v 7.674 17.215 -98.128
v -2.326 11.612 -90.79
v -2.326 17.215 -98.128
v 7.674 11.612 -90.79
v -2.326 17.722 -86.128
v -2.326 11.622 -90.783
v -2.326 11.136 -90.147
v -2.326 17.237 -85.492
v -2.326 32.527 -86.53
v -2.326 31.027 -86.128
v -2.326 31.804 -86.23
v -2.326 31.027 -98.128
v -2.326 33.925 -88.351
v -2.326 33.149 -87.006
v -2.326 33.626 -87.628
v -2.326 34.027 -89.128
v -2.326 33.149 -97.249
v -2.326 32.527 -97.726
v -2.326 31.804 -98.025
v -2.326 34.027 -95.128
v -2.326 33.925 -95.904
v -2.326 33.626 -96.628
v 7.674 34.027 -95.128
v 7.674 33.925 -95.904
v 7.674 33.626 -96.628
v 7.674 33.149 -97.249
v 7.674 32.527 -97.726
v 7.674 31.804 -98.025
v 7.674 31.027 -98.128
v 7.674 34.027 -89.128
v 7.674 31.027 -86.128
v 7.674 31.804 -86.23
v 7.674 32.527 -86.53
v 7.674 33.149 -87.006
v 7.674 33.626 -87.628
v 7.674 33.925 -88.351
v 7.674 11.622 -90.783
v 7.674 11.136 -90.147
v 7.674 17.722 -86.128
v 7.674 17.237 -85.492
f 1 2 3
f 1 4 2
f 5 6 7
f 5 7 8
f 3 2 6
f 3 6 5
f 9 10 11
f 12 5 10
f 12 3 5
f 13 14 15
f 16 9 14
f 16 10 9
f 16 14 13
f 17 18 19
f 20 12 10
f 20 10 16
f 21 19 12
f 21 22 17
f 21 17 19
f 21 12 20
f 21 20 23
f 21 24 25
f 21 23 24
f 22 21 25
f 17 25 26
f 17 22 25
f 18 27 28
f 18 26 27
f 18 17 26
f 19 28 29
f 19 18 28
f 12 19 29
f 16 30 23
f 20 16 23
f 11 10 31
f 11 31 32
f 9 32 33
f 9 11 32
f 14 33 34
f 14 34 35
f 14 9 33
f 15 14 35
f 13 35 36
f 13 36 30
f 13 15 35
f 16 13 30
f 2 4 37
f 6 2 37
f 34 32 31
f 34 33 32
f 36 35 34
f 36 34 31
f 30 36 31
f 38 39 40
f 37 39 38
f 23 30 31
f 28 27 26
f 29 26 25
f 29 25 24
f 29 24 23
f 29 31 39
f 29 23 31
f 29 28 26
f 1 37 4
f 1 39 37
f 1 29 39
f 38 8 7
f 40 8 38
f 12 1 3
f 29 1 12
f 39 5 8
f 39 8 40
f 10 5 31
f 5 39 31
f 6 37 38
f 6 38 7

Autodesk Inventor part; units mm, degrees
ref_plane "YZ Plane" through (0, 0, 0) normal (1, 0, 0) x (0, 1, 0)
ref_plane "XZ Plane" through (0, 0, 0) normal (0, 1, 0) x (-1, 0, 0)
ref_plane "XY Plane" through (0, 0, 0) normal (0, 0, 1) x (1, 0, 0)
sketch "Sketch1" plane through (0, 0, 0) normal (0, 1, 0) x (-1, 0, 0)
  line L0 (2.325581, 24.418605) -> (-7.674419, 24.418605)
  line L1 (-7.674419, 24.418605) -> (-7.674419, -75.581395)
  line L2 (-7.674419, -75.581395) -> (2.325581, -75.581395)
  line L3 (2.325581, -75.581395) -> (2.325581, 24.418605)
  point P0 (0, 0)
  dimension "d2" = 100
  dimension "d3" = 10
extrude "Extrusion1" add sketch "Sketch1" along normal blind 10
sketch "Sketch9" plane through (7.674419, 0, 24.418605) normal (1, 0, 0) x (0, 0, -1)
  line L0 (0, 10) -> (100, 10) projected
  line L1 (0, 0) -> (100, 0) projected
  line L2 (0, 10) -> (100, 10)
  line L3 (100, 10) -> (100, 0)
  line L4 (100, 0) -> (0, 0)
  line L5 (0, 0) -> (0, 10)
  point P0 (24.418605, 0)
extrude "Extrusion8" cut sketch "Sketch9" against normal blind 5
sketch "Sketch10" plane through (2.674419, 0, 24.418605) normal (1, 0, 0) x (0, 0, -1)
  line L0 (100, 0) -> (100, 10) projected
  line L1 (100, 10) -> (126, 10)
  line L2 (126, 10) -> (126, 29.842)
  line L3 (126, 29.842) -> (100, 10)
  line L4 (126, 29.842) -> (126, 19.842)
  line L5 (126, 19.842) -> (100, 0)
  point P0 (24.418605, 0)
  dimension "d44" = 19.842
  dimension "d45" = 26
  dimension "d46" = 10
extrude "Extrusion9" add sketch "Sketch10" against normal blind 5 contours L0 L1 L5 | L3 L2 L5 L1
sketch "Sketch12" plane through (2.674419, 0, 24.418605) normal (1, 0, 0) x (0, 0, -1)
  line L0 (100, 0) -> (0, 0)
  line L1 (126, 29.842) -> (126, 19.842)
  line L2 (99.933064, 0) -> (126, 19.842)
  line L3 (126, 19.842) -> (126, 29.842)
  line L4 (126, 29.842) -> (99.933064, 10)
  line L5 (99.933064, 10) -> (99.933064, 0)
  point P0 (24.418605, 0)
extrude "Extrusion10" add sketch "Sketch12" along normal blind 5
sketch "Sketch13" plane through (2.674419, 0, 24.418605) normal (1, 0, 0) x (0, 0, -1)
  line L0 (100, 10) -> (0, 10) projected
  line L1 (100, 0) -> (0, 0) projected
  line L2 (0, 10) -> (100, 10)
  line L3 (100, 10) -> (100, 0)
  line L4 (100, 0) -> (0, 0)
  line L5 (0, 0) -> (0, 10)
  point P0 (24.418605, 0)
extrude "Extrusion11" add sketch "Sketch13" along normal blind 5
sketch "Sketch2" plane through (0, 10, 0) normal (0, 1, 0) x (1, 0, 0)
  line L0 (-2.325581, -24.418605) -> (7.674419, -24.418605)
  line L1 (7.674419, -24.418605) -> (7.674419, 75.581395)
  line L2 (-2.325581, -24.418605) -> (7.674419, -24.418605)
  line L3 (2.674419, -24.418605) -> (2.674419, -14.418605)
  line L4 (2.674419, -14.418605) -> (2.674419, -4.418605)
  line L5 (2.674419, -4.418605) -> (2.674419, 10.581395)
  line L6 (2.674419, 10.581395) -> (2.674419, 25.581395)
  line L7 (7.674419, 75.581395) -> (-2.325581, 75.581395)
  line L8 (-2.325581, 75.581395) -> (7.674419, 75.581395)
  line L9 (2.674419, -24.418605) -> (2.674419, 25.581395)
  line L10 (2.674419, 25.581395) -> (7.674419, 25.581395)
  line L11 (2.674419, 25.581395) -> (-2.325581, 25.581395)
  line L12 (-2.325581, 75.581395) -> (-2.325581, -24.418605)
  line L13 (2.674419, 25.581395) -> (2.674419, 40.581395)
  line L14 (2.674419, 25.581395) -> (2.674419, 75.581395)
  line L15 (2.674419, 0.581395) -> (-2.325581, 0.581395)
  line L16 (2.674419, 0.581395) -> (7.674419, 0.581395)
  line L17 (2.674419, 50.581395) -> (-2.325581, 50.581395)
  line L18 (7.674419, 50.581395) -> (2.674419, 50.581395)
  circle A0 centre (2.674419, 0.581395) radius 2
  circle A1 centre (2.674419, 25.581395) radius 2
  circle A2 centre (2.674419, 50.581395) radius 2
  point P0 (0, 0)
  dimension "d28" = 4
  dimension "d29" = 4
  dimension "d30" = 4
extrude "Extrusion2" cut sketch "Sketch2" against normal blind 10 contours A0 L5 L15 | L15 L5 A0 | A1 L13 L11 | L11 L6 A1 | L16 A0 L5 | L5 A0 L16 | L10 A1 L6 | L13 A1 L10 | A2 L14 L17 | L17 L14 A2 | L18 A2 L14 | L14 A2 L18
sketch "Sketch14" plane through (7.674419, 0, 24.418605) normal (1, 0, 0) x (0, 0, -1)
  line L0 (100, 10) -> (0, 10) projected
  line L1 (126, 19.842) -> (100, 0) projected
  line L2 (100, 10) -> (100, 0)
  point P0 (24.418605, 0)
sketch "Sketch16" plane through (7.674419, 0, 24.418605) normal (1, 0, 0) x (0, 0, -1)
  line L0 (100, 10) -> (126, 29.842)
  line L1 (100, 10) -> (112.896482, 19.842)
  line L2 (112.896482, 19.842) -> (113.514198, 20.313412)
  line L3 (113.514198, 20.313412) -> (118.329114, 14.004177)
  line L4 (117.711399, 13.532765) -> (112.884086, 19.858243)
  line L5 (117.711399, 13.532765) -> (118.329114, 14.004177)
  point P0 (24.418605, 0)
  dimension "d60" = 16.22295
  dimension "d61" = 0.77705
extrude "Extrusion13" add sketch "Sketch16" against normal blind 10
sketch "Sketch20" plane through (7.674419, 0, 24.418605) normal (1, 0, 0) x (0, 0, -1)
  line L0 (100, 10) -> (0, 10) projected
  line L1 (100, 10) -> (128, 10)
  line L2 (128, 10) -> (128, 0)
  line L3 (128, 0) -> (100, 0)
  line L4 (100, 0) -> (100, 10)
  line L5 (126, 29.842) -> (100, 10) projected
  line L6 (100, 10) -> (126, 10)
  line L7 (126, 10) -> (126, 29.842)
  line L8 (126, 29.842) -> (100, 29.842)
  line L9 (100, 29.842) -> (100, 10)
  point P0 (24.418605, 0)
  dimension "d77" = 28
extrude "Extrusion17" add sketch "Sketch20" against normal blind 10 contours L1 L2 L3 L4
sketch "Sketch21" plane through (7.674419, 0, 24.418605) normal (1, 0, 0) x (0, 0, -1)
  line L0 (128, 0) -> (128, 10)
  line L1 (128, 0) -> (151.87052, 18.170101)
  line L2 (113.070317, 10) -> (126, 19.842)
  line L3 (128, 10) -> (151.239467, 27.689747)
  line L4 (151.87052, 18.170101) -> (151.87052, 28.170101)
  line L5 (151.87052, 28.170101) -> (151.239467, 27.689747)
  line L6 (100, 10) -> (0, 10)
  line L7 (126, 29.842) -> (100, 29.842)
  line L8 (100, 29.842) -> (100, 10)
  line L9 (100, 10) -> (126, 10)
  line L10 (126, 10) -> (126, 29.842)
  point P0 (24.418605, 0)
extrude "Extrusion18" add sketch "Sketch21" against normal blind 10 contours L0 L3 L5 L4 L1
sketch "Sketch22" plane through (7.674419, 0, 24.418605) normal (1, 0, 0) x (0, 0, -1)
  line L0 (100, 10) -> (126, 29.842) projected
  line L1 (100, 10) -> (0, 10) projected
  line L2 (126, 29.842) -> (100, 29.842)
  line L3 (100, 29.842) -> (100, 10)
  line L4 (100, 10) -> (126, 10)
  line L5 (126, 10) -> (126, 29.842)
  point P0 (24.418605, 0)
extrude "Extrusion19" cut sketch "Sketch22" against normal blind 10
sketch "Sketch23" plane through (7.674419, 0, 24.418605) normal (1, 0, 0) x (0, 0, -1)
  line L0 (151.87052, 18.170101) -> (128, 0)
  line L1 (141.891396, 10.57405) -> (136.99663, 17.004426)
  line L2 (128, 0) -> (151.87052, 18.170101)
  line L3 (128, 10) -> (151.87052, 28.170101)
  line L4 (137.071931, 16.905501) -> (151.87052, 28.170101)
  line L5 (151.87052, 28.170101) -> (151.87052, 18.170101)
  line L6 (141.891396, 10.57405) -> (151.87052, 18.170101)
  point P0 (24.418605, 0)
  point P1 (137.071931, 16.905501)
extrude "Extrusion20" cut sketch "Sketch23" against normal blind 10
sketch "Sketch24" plane through (7.674419, 0, 24.418605) normal (1, 0, 0) x (0, 0, -1)
  line L0 (141.891396, 10.57405) -> (137.071931, 16.905501)
  line L1 (137.071931, 16.905501) -> (120.042183, 39.277911)
  line L2 (120.042183, 39.277911) -> (114.78111, 35.273213)
  line L3 (114.78111, 35.273213) -> (131.810859, 12.900804)
  line L4 (128, 10) -> (137.071931, 16.905501)
  line L5 (130.433663, 25.626361) -> (125.172591, 21.621663)
  point P0 (24.418605, 0)
extrude "Extrusion21" add sketch "Sketch24" against normal blind 10 contours L4 L3 L5 L1
sketch "Sketch25" plane through (7.674419, 0, 24.418605) normal (1, 0, 0) x (0, 0, -1)
  circle A0 centre (130.028114, 20.963065) radius 1.414214
  line L0 (128, 0) -> (141.891396, 10.57405)
  point P0 (24.418605, 0)
  dimension "d88" = 15.452
extrude "Extrusion22" cut sketch "Sketch25" against normal blind 10
sketch "Sketch26" plane through (7.674419, 0, 24.418605) normal (1, 0, 0) x (0, 0, -1)
  line L0 (146.180534, 13.38523) -> (129.005429, 0.311641)
  line L1 (128, 0) -> (141.891396, 10.57405)
  line L2 (129.005429, 0.311641) -> (127.101128, -1.137903)
  line L3 (128, 0) -> (128.596019, 0)
  line L4 (128, 10) -> (141.733271, 10)
  point P0 (24.418605, 0)
  point P1 (137.592982, 6.848436)
  point P2 (141.137252, 10)
  dimension "d89" = 0.361
extrude "Extrusion23" add sketch "Sketch26" against normal blind 10
sketch "Sketch27" plane through (7.674419, 0, 24.418605) normal (1, 0, 0) x (0, 0, -1)
  line L0 (128.596019, 0) -> (141.733271, 10)
  line L1 (141.733271, 10) -> (143.644553, 11.454856)
  line L2 (141.733271, 10) -> (141.137252, 10)
  line L3 (141.733271, 10) -> (141.137252, 10)
  line L4 (141.137252, 10) -> (143.4259, 11.742106)
  line L5 (143.4259, 11.742106) -> (143.644553, 11.454856)
  line L6 (143.4259, 11.742106) -> (141.608381, 14.129826)
  line L7 (141.608381, 14.129826) -> (140.073877, 12.96177)
  line L8 (130.433663, 25.626361) -> (141.891396, 10.57405)
  line L9 (141.891396, 10.57405) -> (140.073877, 12.96177)
  line L10 (141.891396, 10.57405) -> (130.433663, 25.626361)
  point P0 (24.418605, 0)
  dimension "d92" = 2.402
extrude "Extrusion24" add sketch "Sketch27" against normal blind 10
sketch "Sketch28" plane through (7.674419, 0, 24.418605) normal (1, 0, 0) x (0, 0, -1)
  line L0 (129.774875, 26.828636) -> (140.680759, 12.501302)
  line L1 (140.073877, 12.96177) -> (130.433663, 25.626361)
  line L2 (130.433663, 25.626361) -> (130.595987, 25.749921)
  line L3 (140.073877, 12.96177) -> (141.608381, 14.129826)
  line L4 (140.073877, 12.96177) -> (140.2362, 13.08533)
  line L5 (140.073877, 12.96177) -> (130.433663, 25.626361)
  point P0 (24.418605, 0)
  dimension "d95" = 0.204
extrude "Extrusion25" add sketch "Sketch28" against normal blind 10
sketch "Sketch29" plane through (7.674419, 0, 24.418605) normal (1, 0, 0) x (0, 0, -1)
  line L0 (130.595987, 25.749921) -> (140.2362, 13.08533)
  line L1 (130.595987, 25.749921) -> (115.000185, 13.878487)
  line L2 (143.644553, 11.454856) -> (128.596019, 0)
  line L3 (137.494115, 6.773179) -> (119.565826, 30.326023)
  line L4 (122.798086, 19.814204) -> (116.546182, 28.027488)
  line L5 (116.546182, 28.027488) -> (116.546182, 10)
  line L6 (0, 10) -> (128, 10)
  line L7 (128, 10) -> (100, 10)
  line L8 (116.546182, 28.027488) -> (110.546182, 28.027488)
  line L9 (110.546182, 28.027488) -> (110.546182, 34.027488)
  line L10 (116.546182, 28.027488) -> (122.546182, 28.027488)
  line L11 (122.546182, 28.027488) -> (122.546182, 10)
  line L12 (110.546182, 34.027488) -> (122.546182, 34.027488)
  line L13 (122.546182, 34.027488) -> (122.546182, 10)
  line L14 (122.546182, 10) -> (110.546182, 10)
  line L15 (110.546182, 10) -> (110.546182, 34.027488)
  point P0 (24.418605, 0)
  point P1 (122.546182, 28.027488)
  point P2 (110.546182, 28.027488)
  point P3 (110.546182, 10)
  point P4 (122.546182, 10)
  dimension "d98" = 19.6
  dimension "d99" = 29.6
  dimension "d101" = 6
  dimension "d102" = 6
  dimension "d103" = 6
extrude "Extrusion26" add sketch "Sketch29" against normal blind 10 contours L11 L4 L10 L3 | L3 L10 L11 | L11 L6 L5 L1 | L1 L5 L4 L11 | L10 L8 L9 L12 L13 | L5 L6 L15 L8
sketch "Sketch30" plane through (7.674419, 0, 24.418605) normal (1, 0, 0) x (0, 0, -1)
  line L0 (122.546182, 34.027488) -> (122.546182, 10)
  line L1 (122.546182, 34.027488) -> (144, 34.027488)
  line L2 (144, 34.027488) -> (144, 0)
  line L3 (144, 0) -> (122.546182, 0)
  line L4 (122.546182, 0) -> (122.546182, 34.027488)
  point P0 (24.418605, 0)
extrude "Extrusion27" cut sketch "Sketch30" against normal blind 10
sketch "Sketch31" plane through (7.674419, 0, 24.418605) normal (1, 0, 0) x (0, 0, -1)
  line L0 (110.546182, 34.027488) -> (110.546182, 10)
  line L1 (110.546182, 10) -> (113, 10)
  line L2 (110.546182, 10) -> (114, 10)
  line L3 (114, 10) -> (114, 17)
  line L4 (114, 17) -> (110.546182, 17)
  line L5 (110.546182, 17) -> (110.546182, 10)
  point P0 (24.418605, 0)
extrude "Extrusion28" cut sketch "Sketch31" against normal blind 10
sketch "Sketch32" plane through (7.674419, 0, 24.418605) normal (1, 0, 0) x (0, 0, -1)
  line L0 (114, 17) -> (110.546182, 17)
  line L1 (114, 17) -> (114, 10)
  line L2 (110.546182, 17) -> (114, 10)
  line L3 (114, 10) -> (114, 17)
  line L4 (114, 17) -> (110.546182, 17)
  point P0 (24.418605, 0)
extrude "Extrusion29" add sketch "Sketch32" against normal blind 10
sketch "Sketch33" plane through (7.674419, 0, 24.418605) normal (1, 0, 0) x (0, 0, -1)
  line L0 (100, 10.050951) -> (99.933064, 10)
  line L1 (100, 10.050951) -> (99.933064, 10)
  line L2 (99.933064, 10) -> (100, 10)
  line L3 (99.933064, 10) -> (100, 10)
  line L4 (100, 10) -> (100, 10.050951)
  line L5 (100, 10) -> (100, 10.050951)
  point P0 (24.418605, 0)
extrude "Extrusion30" cut sketch "Sketch33" against normal blind 10
sketch "Sketch34" plane through (7.674419, 0, 24.418605) normal (1, 0, 0) x (0, 0, -1)
  line L0 (119.614525, 21.220993) -> (127.725416, 4.782304)
  line L1 (110.546182, 17) -> (114, 10)
  line L2 (127.725416, 4.782304) -> (130.085017, 0)
  line L3 (122.546182, 0) -> (0, 0)
  line L4 (116.504679, 0) -> (130.085017, 0)
  line L5 (127.725416, 4.782304) -> (130.085017, 0)
  line L6 (122.546182, 34.027488) -> (122.546182, 0)
  line L7 (122.546182, 15.279278) -> (122.546182, 0)
  point P0 (24.418605, 0)
  dimension "d114" = 10
extrude "Extrusion31" add sketch "Sketch34" against normal blind 10
fillet "Fillet2" radius 2 1 edges at (2.6744, 0, -105.6664)
fillet "Fillet3" radius 3 6 edges at (2.6744, 15.2793, -98.1276) (2.6744, 34.0275, -98.1276) (2.6744, 34.0275, -86.1276) (2.6744, 17, -86.1276) (2.6744, 10, 24.4186) (2.6744, 0, 24.4186)
sketch "Sketch35" plane through (7.674419, 0, 24.418605) normal (1, 0, 0) x (0, 0, -1)
  arc A0 (110.546182, 17.699829) -> (110.855838, 16.372406) centre (113.546182, 17.699829) ccw
  line L0 (110.546182, 17.699829) -> (115.999721, 10.054757)
  line L1 (115.999721, 10.054757) -> (113.999721, 10.054757)
  line L2 (110.546182, 17.699829) -> (110.546182, 10.054757)
  line L3 (110.546182, 10.054757) -> (115.999721, 10.054757)
  line L4 (114, 10) -> (3, 10)
  line L5 (110.546182, 10.054757) -> (115.999721, 10.054757)
  point P0 (24.418605, 0)
  point P1 (3, 10)
extrude "Extrusion32" cut sketch "Sketch35" against normal blind 10
sketch "Sketch36" plane through (7.674419, 0, 24.418605) normal (1, 0, 0) x (0, 0, -1)
  line L0 (107, 10) -> (116.657393, 10)
  line L1 (110.546182, 17.699829) -> (115.999721, 10.054757)
  line L2 (3, 0) -> (126.868013, 0)
  line L3 (126, 19.842105) -> (100, 0)
  line L4 (114.482105, 12.631671) -> (116.575951, 9.696402)
  line L5 (115.211679, 11.608913) -> (109.490162, 19.106074)
  line L6 (110.546182, 31.027488) -> (110.546182, 17.699829)
  line L7 (110.546182, 17.699829) -> (110.546182, 10)
  line L8 (110.546182, 10) -> (116.359382, 10)
  point P0 (24.418605, 0)
  point P1 (110.546182, 17.722323)
  dimension "d121" = 0.261
extrude "Extrusion33" cut sketch "Sketch36" against normal blind 10
fillet "Fillet4" radius 1 2 edges at (2.6744, 10, -91.9408) (2.6744, 11.6089, -90.7931)
sketch "Sketch37" plane through (7.674419, 0, 24.418605) normal (1, 0, 0) x (0, 0, -1)
  line L0 (122.546182, 15.979107) -> (122.546182, 31.027488)
  line L1 (122.546182, 17.214621) -> (138.398773, 0)
  line L2 (138.398773, 0) -> (100, 0)
  line L3 (100, 0) -> (122.546182, 17.214621)
  line L4 (0, 10) -> (129.189978, 10)
  line L5 (0, 10) -> (0, 0)
  line L6 (0, 0) -> (138.398773, 0)
  point P0 (24.418605, 0)
  point P1 (113.097112, 10)
extrude "Extrusion34" cut sketch "Sketch37" against normal blind 10
sketch "Sketch38" plane through (-2.325581, 17.722323, -86.127577) normal (0, -0.6066733, 0.7949513) x (1, 0, 0)
  line L0 (0, 0) -> (0, 10.576957)
  line L1 (10, -7.674172) -> (0, -7.674172)
  line L2 (0, 0) -> (10, 0)
  line L3 (10, 0) -> (10, -7.674172)
  line L4 (10, -7.674172) -> (0, -7.674172)
  line L5 (0, -7.674172) -> (0, 0)
  point P0 (2.325581, 38.162919)
  point P1 (0, -7.674172)
extrude "Extrusion35" add sketch "Sketch38" along normal blind 0.8
equation "\"d0\" = d3"
properties part number "rod"
